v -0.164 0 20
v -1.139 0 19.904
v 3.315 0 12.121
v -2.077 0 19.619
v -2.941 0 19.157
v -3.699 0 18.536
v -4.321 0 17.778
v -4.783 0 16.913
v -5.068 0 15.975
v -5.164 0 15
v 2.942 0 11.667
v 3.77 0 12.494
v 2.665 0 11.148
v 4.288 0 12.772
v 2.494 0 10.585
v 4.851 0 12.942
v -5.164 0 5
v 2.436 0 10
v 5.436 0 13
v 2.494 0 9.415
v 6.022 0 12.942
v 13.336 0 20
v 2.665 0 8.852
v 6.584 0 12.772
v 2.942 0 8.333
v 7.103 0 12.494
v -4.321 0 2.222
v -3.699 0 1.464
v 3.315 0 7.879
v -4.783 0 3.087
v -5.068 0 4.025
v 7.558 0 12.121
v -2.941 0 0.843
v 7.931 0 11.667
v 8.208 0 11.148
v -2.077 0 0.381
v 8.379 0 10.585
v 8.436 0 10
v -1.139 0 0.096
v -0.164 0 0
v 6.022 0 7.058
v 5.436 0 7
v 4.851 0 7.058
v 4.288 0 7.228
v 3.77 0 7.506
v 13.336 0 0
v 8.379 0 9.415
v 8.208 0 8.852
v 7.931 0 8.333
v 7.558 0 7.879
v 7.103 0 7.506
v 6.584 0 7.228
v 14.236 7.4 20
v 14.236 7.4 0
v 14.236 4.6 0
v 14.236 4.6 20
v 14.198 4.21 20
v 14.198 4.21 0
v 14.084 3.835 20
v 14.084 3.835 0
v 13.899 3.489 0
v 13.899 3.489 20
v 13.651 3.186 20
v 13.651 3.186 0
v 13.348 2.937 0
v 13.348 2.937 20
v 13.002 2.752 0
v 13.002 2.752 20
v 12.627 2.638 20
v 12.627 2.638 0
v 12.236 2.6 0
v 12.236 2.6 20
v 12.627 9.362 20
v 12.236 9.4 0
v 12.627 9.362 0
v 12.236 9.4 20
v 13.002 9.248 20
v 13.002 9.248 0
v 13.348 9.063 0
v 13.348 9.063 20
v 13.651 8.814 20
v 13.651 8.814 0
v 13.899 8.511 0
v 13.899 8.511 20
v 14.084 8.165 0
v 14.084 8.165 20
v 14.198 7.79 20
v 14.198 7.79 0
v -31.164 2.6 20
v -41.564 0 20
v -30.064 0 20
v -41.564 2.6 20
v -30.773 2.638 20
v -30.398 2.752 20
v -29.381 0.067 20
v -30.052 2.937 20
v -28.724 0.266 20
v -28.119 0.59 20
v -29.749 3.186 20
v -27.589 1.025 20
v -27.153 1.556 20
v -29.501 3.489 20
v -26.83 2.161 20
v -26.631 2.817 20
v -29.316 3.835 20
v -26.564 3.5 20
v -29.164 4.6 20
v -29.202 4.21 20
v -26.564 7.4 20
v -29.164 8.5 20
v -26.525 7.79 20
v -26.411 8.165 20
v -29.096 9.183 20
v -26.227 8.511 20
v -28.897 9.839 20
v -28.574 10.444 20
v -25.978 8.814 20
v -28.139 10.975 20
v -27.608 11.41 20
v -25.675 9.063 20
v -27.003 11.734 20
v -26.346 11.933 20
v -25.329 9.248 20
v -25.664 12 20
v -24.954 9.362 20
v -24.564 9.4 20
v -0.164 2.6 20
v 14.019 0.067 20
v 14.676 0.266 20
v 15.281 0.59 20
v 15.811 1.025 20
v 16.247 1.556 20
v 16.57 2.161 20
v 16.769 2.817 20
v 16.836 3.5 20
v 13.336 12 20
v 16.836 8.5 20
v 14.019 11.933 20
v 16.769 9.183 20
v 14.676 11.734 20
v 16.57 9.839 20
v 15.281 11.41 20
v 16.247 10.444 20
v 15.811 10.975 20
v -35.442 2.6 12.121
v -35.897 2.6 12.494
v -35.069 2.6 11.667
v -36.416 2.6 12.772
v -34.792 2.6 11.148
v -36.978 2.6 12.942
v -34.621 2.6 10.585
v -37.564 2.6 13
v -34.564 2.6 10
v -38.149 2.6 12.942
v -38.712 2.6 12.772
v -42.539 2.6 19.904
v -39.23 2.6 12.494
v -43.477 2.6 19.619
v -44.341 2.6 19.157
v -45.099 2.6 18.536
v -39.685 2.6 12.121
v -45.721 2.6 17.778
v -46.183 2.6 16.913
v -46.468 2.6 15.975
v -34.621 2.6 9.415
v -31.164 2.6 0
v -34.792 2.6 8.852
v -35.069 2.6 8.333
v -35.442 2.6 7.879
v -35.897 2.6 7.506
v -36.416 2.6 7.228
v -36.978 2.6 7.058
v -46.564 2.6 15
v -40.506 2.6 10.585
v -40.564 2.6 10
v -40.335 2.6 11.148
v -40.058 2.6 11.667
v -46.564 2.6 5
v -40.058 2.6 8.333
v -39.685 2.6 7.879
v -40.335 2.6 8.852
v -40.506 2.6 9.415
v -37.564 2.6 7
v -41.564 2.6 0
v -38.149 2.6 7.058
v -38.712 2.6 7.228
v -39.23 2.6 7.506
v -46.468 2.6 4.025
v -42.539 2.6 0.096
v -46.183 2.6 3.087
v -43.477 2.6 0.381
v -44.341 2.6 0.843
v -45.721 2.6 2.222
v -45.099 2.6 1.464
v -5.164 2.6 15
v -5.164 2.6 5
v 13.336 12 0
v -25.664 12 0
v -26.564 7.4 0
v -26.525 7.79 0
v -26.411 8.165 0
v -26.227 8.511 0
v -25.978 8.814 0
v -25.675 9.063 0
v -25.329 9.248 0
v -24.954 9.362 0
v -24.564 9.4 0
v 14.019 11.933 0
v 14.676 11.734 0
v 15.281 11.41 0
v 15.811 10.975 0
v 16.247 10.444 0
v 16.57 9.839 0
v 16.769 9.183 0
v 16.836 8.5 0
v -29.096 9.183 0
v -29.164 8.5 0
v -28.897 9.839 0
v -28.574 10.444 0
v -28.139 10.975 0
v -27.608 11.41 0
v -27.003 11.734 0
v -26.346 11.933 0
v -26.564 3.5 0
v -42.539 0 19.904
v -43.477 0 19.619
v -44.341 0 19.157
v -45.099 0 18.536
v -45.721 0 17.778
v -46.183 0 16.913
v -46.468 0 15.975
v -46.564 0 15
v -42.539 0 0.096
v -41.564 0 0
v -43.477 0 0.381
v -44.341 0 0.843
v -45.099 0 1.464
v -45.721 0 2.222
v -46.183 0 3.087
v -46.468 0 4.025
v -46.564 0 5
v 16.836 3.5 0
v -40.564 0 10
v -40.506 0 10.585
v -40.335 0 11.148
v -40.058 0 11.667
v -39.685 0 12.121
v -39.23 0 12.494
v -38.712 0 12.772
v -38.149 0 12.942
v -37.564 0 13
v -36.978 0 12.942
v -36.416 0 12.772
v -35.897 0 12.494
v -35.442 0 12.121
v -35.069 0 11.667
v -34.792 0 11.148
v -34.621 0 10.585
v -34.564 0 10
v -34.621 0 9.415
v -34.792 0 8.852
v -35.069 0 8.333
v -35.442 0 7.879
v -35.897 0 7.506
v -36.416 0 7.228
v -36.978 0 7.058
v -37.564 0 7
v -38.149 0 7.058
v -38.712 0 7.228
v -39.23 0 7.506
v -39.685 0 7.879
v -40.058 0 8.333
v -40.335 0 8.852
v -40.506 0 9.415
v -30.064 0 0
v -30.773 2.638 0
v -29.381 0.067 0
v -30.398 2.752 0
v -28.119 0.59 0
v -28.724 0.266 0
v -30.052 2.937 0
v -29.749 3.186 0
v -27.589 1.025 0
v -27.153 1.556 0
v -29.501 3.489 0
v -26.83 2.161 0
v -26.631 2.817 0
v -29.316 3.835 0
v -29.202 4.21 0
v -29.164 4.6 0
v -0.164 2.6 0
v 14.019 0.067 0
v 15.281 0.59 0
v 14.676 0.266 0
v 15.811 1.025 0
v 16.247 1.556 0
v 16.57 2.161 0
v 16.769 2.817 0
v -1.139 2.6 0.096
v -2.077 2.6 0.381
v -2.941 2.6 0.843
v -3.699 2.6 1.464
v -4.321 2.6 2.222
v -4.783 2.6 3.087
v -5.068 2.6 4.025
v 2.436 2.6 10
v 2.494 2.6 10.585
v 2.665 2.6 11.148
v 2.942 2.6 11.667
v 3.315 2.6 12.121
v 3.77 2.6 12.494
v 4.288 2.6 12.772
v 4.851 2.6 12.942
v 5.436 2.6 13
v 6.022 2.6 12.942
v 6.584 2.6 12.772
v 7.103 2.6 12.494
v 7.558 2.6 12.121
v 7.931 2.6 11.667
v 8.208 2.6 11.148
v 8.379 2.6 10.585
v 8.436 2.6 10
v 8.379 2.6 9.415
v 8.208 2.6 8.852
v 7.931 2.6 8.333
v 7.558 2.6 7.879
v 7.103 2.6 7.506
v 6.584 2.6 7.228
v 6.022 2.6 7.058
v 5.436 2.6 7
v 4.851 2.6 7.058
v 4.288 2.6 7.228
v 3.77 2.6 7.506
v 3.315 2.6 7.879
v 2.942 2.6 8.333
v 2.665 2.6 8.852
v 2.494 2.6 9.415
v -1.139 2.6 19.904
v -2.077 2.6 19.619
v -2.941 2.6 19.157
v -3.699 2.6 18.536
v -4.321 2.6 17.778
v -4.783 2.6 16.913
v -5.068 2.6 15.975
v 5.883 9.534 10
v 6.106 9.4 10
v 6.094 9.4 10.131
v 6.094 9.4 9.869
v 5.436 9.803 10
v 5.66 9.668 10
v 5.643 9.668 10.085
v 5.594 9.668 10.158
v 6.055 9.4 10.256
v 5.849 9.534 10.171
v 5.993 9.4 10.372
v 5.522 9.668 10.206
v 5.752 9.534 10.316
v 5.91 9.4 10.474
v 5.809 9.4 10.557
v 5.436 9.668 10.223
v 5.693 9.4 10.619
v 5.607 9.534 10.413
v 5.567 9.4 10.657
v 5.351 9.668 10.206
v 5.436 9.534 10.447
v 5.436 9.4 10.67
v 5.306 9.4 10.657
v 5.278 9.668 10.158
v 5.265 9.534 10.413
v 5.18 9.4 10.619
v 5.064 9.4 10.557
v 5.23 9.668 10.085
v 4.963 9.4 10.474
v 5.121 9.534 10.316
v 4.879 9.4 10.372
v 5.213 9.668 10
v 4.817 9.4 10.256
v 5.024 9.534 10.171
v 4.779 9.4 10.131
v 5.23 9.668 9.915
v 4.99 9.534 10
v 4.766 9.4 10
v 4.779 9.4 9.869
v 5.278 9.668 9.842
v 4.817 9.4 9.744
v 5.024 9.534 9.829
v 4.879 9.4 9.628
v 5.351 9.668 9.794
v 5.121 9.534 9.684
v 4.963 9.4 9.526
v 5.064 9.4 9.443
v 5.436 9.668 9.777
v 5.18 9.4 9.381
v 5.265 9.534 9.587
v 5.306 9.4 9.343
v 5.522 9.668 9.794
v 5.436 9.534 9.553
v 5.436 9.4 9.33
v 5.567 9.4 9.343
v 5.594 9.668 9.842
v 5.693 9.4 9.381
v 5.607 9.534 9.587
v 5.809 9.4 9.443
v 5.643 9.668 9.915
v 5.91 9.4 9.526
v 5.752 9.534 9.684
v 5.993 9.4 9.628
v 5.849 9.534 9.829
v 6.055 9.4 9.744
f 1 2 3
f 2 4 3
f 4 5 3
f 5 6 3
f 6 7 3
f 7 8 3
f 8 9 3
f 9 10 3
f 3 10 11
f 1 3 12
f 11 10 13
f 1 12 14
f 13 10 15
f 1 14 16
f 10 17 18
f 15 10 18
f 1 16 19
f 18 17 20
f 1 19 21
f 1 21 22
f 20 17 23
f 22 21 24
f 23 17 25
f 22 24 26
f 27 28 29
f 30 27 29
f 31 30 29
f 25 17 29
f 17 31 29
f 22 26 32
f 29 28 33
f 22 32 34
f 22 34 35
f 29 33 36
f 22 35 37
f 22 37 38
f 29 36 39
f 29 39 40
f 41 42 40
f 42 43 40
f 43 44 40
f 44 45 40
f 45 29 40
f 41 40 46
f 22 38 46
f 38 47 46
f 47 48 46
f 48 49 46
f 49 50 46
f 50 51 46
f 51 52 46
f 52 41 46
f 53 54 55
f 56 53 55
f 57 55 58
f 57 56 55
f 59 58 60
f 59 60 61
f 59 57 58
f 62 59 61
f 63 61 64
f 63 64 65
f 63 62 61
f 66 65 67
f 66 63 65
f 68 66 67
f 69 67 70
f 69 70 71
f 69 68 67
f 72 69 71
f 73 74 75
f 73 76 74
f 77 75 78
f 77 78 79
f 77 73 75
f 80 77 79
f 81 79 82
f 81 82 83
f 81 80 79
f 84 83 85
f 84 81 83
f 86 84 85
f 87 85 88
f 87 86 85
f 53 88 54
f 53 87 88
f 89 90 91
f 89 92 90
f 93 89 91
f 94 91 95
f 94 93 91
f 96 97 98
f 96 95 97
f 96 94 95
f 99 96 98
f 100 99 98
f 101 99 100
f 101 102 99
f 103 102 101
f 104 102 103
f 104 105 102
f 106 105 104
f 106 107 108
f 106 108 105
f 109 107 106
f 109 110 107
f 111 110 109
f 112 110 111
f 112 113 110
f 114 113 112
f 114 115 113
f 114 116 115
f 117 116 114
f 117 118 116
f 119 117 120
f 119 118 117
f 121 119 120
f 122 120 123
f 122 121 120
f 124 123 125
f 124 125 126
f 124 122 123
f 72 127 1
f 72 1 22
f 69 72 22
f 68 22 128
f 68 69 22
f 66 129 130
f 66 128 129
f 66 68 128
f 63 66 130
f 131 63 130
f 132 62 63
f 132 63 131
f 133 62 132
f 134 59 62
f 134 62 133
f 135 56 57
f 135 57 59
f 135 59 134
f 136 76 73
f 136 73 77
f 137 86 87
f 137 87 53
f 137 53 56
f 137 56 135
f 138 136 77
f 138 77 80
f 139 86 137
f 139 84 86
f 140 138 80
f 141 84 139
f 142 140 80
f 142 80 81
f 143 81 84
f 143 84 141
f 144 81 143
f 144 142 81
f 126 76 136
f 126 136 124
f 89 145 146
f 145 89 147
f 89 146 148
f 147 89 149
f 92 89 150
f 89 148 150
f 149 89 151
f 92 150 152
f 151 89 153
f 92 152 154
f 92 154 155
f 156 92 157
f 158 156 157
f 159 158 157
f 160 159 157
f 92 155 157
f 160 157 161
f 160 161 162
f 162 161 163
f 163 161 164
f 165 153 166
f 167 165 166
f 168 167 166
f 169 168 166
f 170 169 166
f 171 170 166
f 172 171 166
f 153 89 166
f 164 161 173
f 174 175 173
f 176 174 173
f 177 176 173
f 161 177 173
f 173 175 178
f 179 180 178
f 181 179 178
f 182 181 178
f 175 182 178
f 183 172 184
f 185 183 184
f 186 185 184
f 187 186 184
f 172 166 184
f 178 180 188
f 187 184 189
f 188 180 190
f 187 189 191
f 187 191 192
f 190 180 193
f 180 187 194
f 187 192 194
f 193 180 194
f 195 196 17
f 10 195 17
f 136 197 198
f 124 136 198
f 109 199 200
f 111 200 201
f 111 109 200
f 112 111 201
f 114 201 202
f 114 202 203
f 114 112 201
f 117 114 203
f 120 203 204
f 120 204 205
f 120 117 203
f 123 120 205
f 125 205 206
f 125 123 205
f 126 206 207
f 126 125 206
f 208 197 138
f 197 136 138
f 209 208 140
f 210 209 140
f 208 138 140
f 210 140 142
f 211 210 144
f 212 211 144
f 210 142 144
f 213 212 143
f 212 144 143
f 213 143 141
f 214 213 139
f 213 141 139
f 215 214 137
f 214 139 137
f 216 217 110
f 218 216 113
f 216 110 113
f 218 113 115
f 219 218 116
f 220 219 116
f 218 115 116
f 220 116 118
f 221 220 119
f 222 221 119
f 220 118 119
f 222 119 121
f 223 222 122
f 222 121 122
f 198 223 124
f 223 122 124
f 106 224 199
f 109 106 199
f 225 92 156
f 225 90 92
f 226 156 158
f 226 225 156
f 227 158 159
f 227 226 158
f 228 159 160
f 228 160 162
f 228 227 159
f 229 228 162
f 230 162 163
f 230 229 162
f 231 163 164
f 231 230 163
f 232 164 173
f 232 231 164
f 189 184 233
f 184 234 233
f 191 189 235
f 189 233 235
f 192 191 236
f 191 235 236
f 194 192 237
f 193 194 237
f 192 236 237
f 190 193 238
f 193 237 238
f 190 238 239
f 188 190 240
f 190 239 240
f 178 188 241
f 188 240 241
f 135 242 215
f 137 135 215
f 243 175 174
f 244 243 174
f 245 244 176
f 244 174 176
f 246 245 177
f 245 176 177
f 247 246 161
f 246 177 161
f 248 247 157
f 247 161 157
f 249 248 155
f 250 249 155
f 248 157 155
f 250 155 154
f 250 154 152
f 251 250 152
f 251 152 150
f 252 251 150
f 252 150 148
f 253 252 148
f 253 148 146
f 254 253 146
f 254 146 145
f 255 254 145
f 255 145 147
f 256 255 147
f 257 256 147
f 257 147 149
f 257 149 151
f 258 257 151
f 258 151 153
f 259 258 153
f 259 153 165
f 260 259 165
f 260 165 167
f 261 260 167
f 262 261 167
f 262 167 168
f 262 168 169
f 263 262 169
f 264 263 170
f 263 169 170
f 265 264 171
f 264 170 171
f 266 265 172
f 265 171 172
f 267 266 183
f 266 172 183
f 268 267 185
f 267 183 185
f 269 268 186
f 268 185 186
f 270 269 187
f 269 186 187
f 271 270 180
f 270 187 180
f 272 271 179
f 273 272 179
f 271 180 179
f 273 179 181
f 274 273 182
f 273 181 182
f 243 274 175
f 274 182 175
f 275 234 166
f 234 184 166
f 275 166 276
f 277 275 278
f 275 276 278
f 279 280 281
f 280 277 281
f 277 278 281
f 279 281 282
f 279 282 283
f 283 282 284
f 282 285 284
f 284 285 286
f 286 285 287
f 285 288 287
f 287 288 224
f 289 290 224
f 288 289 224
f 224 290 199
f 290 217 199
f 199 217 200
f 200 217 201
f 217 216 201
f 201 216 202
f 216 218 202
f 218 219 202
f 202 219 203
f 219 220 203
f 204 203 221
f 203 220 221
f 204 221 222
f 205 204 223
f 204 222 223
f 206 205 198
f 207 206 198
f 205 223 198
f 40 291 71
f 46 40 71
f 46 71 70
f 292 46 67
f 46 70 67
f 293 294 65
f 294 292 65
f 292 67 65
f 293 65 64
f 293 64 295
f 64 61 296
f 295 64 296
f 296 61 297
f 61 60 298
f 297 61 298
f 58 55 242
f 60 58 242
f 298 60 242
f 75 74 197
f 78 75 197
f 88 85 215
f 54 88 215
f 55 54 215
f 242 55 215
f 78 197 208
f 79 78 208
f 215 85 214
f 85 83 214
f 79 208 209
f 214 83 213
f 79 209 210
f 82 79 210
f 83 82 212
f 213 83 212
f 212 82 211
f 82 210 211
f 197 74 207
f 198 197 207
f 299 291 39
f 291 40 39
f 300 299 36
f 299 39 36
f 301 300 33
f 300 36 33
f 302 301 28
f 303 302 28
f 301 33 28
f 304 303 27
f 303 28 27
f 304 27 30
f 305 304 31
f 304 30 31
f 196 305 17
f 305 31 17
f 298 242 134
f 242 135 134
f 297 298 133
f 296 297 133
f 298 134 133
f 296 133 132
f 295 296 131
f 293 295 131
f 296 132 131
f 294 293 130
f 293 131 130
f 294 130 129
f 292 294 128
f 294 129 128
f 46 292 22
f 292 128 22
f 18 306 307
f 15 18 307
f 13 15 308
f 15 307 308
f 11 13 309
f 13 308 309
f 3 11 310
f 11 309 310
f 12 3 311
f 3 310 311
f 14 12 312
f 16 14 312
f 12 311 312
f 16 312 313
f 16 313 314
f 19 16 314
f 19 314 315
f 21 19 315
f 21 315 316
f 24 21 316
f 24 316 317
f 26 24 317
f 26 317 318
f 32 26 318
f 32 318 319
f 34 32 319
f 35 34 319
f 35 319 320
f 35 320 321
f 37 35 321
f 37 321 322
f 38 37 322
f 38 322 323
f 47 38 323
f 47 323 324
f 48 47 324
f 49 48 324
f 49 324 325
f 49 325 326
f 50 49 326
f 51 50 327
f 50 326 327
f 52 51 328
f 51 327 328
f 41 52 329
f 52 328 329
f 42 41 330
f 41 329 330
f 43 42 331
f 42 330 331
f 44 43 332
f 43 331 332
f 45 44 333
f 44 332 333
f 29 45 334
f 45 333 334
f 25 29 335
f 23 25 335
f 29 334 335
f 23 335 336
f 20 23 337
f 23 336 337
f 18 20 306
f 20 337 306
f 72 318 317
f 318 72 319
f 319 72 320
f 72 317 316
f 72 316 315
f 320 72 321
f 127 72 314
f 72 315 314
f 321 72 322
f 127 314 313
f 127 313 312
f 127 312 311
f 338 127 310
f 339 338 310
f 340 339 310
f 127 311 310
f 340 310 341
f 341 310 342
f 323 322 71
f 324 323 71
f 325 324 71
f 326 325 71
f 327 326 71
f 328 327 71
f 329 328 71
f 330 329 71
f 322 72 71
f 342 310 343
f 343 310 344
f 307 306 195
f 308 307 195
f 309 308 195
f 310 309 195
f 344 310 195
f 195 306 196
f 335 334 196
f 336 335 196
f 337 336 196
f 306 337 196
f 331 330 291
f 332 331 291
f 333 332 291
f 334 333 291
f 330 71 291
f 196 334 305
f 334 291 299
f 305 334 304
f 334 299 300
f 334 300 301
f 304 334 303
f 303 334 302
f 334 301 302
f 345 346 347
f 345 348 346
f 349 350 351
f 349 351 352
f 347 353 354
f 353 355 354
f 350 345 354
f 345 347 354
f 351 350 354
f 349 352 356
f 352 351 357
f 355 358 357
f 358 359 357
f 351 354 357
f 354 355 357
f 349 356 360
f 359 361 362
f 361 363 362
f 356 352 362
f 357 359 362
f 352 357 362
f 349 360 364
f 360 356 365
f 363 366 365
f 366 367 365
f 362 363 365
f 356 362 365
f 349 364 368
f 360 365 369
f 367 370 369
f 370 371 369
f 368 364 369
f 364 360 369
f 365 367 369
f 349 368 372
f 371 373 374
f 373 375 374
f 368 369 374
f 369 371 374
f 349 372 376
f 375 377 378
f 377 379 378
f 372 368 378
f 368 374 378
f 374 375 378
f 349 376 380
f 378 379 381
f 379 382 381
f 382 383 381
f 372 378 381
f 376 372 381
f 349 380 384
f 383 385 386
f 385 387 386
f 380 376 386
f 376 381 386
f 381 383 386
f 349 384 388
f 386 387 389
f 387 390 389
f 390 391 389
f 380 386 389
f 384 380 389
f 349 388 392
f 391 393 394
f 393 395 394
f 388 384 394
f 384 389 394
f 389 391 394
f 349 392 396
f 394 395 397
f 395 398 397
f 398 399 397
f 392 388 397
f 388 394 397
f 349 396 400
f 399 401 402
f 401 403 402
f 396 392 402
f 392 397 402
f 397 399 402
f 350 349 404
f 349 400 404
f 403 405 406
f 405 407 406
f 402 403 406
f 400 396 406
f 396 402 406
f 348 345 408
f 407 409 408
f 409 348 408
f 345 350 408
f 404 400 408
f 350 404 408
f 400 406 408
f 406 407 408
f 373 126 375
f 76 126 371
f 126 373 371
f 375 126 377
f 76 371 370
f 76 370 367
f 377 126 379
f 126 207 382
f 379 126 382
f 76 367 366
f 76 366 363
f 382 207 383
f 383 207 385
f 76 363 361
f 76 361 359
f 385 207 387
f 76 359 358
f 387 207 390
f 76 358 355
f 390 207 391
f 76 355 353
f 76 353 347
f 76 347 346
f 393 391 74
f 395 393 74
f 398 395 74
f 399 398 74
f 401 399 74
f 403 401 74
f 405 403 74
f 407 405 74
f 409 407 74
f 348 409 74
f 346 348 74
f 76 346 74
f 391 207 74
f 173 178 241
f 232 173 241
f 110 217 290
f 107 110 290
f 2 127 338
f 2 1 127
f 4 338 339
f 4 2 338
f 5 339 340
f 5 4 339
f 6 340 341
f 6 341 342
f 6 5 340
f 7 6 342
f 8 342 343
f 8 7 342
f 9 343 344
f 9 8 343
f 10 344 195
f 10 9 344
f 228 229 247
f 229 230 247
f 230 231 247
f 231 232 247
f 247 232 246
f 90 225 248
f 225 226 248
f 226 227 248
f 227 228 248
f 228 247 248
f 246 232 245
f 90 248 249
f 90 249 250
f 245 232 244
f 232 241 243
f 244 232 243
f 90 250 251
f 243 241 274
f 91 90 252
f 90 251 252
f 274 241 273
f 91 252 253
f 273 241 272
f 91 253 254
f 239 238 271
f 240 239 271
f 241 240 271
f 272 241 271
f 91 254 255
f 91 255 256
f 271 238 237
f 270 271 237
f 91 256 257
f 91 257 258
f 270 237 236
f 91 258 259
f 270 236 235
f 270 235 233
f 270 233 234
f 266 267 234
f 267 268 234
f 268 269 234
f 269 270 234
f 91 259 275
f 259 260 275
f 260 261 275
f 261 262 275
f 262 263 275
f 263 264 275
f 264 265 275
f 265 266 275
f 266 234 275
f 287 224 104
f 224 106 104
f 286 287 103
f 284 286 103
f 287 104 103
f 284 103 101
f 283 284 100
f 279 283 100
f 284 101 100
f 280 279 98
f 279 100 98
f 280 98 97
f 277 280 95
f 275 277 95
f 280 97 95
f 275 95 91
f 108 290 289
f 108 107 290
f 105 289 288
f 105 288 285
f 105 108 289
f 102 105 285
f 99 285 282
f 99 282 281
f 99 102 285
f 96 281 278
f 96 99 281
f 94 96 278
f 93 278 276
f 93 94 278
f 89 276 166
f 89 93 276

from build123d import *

# Parameters (mm, degrees)
F1_DEPTH = 20
F2_R     = 2
F3_R     = 3.5
F4_R     = 5
F6_D     = 6
F6_DEPTH = 8
F6_TIP   = 1.8025818571


with BuildPart() as f1:
    # F0 (on Top) → F1 (new body)
    with BuildSketch(Plane.XY):
        Polygon((-46.5636339205, 2.6), (-46.5636339205, 0), (-26.5636339205, 0), (-26.5636339205, 9.4), (14.2363660795, 9.4), (14.2363660795, 2.6), (-5.1636339205, 2.6), (-5.1636339205, 0), (16.8363660795, 0), (16.8363660795, 12), (-29.1636339205, 12), (-29.1636339205, 2.6), align=None)
    extrude(amount=F1_DEPTH)

    # F2
    f2_edges = [f1.edges().sort_by_distance(p)[0] for p in [
        (-29.163634, 2.6, 10),
        (14.236366, 2.6, 10),
        (14.236366, 9.4, 10),
        (-26.563634, 9.4, 10),
    ]]
    fillet(f2_edges, radius=F2_R)

    # F3
    f3_edges = [f1.edges().sort_by_distance(p)[0] for p in [
        (16.836366, 12, 10),
        (-29.163634, 12, 10),
        (-26.563634, 0, 10),
        (16.836366, 0, 10),
    ]]
    fillet(f3_edges, radius=F3_R)

    # F4
    f4_edges = [f1.edges().sort_by_distance(p)[0] for p in [
        (-46.563634, 1.3, 0),
        (-46.563634, 1.3, 20),
        (-5.163634, 1.3, 20),
        (-5.163634, 1.3, 0),
    ]]
    fillet(f4_edges, radius=F4_R)

    # F6
    with Locations(Plane.XZ):
        with Locations((-37.5636339205, 10), (5.4363660795, 10)):
            Hole(F6_D / 2, depth=F6_DEPTH)
            with Locations((0, 0, -(F6_DEPTH + F6_TIP / 2))):  # 118° drill point
                Cone(0, F6_D / 2, F6_TIP, mode=Mode.SUBTRACT)


solid = f1.part
